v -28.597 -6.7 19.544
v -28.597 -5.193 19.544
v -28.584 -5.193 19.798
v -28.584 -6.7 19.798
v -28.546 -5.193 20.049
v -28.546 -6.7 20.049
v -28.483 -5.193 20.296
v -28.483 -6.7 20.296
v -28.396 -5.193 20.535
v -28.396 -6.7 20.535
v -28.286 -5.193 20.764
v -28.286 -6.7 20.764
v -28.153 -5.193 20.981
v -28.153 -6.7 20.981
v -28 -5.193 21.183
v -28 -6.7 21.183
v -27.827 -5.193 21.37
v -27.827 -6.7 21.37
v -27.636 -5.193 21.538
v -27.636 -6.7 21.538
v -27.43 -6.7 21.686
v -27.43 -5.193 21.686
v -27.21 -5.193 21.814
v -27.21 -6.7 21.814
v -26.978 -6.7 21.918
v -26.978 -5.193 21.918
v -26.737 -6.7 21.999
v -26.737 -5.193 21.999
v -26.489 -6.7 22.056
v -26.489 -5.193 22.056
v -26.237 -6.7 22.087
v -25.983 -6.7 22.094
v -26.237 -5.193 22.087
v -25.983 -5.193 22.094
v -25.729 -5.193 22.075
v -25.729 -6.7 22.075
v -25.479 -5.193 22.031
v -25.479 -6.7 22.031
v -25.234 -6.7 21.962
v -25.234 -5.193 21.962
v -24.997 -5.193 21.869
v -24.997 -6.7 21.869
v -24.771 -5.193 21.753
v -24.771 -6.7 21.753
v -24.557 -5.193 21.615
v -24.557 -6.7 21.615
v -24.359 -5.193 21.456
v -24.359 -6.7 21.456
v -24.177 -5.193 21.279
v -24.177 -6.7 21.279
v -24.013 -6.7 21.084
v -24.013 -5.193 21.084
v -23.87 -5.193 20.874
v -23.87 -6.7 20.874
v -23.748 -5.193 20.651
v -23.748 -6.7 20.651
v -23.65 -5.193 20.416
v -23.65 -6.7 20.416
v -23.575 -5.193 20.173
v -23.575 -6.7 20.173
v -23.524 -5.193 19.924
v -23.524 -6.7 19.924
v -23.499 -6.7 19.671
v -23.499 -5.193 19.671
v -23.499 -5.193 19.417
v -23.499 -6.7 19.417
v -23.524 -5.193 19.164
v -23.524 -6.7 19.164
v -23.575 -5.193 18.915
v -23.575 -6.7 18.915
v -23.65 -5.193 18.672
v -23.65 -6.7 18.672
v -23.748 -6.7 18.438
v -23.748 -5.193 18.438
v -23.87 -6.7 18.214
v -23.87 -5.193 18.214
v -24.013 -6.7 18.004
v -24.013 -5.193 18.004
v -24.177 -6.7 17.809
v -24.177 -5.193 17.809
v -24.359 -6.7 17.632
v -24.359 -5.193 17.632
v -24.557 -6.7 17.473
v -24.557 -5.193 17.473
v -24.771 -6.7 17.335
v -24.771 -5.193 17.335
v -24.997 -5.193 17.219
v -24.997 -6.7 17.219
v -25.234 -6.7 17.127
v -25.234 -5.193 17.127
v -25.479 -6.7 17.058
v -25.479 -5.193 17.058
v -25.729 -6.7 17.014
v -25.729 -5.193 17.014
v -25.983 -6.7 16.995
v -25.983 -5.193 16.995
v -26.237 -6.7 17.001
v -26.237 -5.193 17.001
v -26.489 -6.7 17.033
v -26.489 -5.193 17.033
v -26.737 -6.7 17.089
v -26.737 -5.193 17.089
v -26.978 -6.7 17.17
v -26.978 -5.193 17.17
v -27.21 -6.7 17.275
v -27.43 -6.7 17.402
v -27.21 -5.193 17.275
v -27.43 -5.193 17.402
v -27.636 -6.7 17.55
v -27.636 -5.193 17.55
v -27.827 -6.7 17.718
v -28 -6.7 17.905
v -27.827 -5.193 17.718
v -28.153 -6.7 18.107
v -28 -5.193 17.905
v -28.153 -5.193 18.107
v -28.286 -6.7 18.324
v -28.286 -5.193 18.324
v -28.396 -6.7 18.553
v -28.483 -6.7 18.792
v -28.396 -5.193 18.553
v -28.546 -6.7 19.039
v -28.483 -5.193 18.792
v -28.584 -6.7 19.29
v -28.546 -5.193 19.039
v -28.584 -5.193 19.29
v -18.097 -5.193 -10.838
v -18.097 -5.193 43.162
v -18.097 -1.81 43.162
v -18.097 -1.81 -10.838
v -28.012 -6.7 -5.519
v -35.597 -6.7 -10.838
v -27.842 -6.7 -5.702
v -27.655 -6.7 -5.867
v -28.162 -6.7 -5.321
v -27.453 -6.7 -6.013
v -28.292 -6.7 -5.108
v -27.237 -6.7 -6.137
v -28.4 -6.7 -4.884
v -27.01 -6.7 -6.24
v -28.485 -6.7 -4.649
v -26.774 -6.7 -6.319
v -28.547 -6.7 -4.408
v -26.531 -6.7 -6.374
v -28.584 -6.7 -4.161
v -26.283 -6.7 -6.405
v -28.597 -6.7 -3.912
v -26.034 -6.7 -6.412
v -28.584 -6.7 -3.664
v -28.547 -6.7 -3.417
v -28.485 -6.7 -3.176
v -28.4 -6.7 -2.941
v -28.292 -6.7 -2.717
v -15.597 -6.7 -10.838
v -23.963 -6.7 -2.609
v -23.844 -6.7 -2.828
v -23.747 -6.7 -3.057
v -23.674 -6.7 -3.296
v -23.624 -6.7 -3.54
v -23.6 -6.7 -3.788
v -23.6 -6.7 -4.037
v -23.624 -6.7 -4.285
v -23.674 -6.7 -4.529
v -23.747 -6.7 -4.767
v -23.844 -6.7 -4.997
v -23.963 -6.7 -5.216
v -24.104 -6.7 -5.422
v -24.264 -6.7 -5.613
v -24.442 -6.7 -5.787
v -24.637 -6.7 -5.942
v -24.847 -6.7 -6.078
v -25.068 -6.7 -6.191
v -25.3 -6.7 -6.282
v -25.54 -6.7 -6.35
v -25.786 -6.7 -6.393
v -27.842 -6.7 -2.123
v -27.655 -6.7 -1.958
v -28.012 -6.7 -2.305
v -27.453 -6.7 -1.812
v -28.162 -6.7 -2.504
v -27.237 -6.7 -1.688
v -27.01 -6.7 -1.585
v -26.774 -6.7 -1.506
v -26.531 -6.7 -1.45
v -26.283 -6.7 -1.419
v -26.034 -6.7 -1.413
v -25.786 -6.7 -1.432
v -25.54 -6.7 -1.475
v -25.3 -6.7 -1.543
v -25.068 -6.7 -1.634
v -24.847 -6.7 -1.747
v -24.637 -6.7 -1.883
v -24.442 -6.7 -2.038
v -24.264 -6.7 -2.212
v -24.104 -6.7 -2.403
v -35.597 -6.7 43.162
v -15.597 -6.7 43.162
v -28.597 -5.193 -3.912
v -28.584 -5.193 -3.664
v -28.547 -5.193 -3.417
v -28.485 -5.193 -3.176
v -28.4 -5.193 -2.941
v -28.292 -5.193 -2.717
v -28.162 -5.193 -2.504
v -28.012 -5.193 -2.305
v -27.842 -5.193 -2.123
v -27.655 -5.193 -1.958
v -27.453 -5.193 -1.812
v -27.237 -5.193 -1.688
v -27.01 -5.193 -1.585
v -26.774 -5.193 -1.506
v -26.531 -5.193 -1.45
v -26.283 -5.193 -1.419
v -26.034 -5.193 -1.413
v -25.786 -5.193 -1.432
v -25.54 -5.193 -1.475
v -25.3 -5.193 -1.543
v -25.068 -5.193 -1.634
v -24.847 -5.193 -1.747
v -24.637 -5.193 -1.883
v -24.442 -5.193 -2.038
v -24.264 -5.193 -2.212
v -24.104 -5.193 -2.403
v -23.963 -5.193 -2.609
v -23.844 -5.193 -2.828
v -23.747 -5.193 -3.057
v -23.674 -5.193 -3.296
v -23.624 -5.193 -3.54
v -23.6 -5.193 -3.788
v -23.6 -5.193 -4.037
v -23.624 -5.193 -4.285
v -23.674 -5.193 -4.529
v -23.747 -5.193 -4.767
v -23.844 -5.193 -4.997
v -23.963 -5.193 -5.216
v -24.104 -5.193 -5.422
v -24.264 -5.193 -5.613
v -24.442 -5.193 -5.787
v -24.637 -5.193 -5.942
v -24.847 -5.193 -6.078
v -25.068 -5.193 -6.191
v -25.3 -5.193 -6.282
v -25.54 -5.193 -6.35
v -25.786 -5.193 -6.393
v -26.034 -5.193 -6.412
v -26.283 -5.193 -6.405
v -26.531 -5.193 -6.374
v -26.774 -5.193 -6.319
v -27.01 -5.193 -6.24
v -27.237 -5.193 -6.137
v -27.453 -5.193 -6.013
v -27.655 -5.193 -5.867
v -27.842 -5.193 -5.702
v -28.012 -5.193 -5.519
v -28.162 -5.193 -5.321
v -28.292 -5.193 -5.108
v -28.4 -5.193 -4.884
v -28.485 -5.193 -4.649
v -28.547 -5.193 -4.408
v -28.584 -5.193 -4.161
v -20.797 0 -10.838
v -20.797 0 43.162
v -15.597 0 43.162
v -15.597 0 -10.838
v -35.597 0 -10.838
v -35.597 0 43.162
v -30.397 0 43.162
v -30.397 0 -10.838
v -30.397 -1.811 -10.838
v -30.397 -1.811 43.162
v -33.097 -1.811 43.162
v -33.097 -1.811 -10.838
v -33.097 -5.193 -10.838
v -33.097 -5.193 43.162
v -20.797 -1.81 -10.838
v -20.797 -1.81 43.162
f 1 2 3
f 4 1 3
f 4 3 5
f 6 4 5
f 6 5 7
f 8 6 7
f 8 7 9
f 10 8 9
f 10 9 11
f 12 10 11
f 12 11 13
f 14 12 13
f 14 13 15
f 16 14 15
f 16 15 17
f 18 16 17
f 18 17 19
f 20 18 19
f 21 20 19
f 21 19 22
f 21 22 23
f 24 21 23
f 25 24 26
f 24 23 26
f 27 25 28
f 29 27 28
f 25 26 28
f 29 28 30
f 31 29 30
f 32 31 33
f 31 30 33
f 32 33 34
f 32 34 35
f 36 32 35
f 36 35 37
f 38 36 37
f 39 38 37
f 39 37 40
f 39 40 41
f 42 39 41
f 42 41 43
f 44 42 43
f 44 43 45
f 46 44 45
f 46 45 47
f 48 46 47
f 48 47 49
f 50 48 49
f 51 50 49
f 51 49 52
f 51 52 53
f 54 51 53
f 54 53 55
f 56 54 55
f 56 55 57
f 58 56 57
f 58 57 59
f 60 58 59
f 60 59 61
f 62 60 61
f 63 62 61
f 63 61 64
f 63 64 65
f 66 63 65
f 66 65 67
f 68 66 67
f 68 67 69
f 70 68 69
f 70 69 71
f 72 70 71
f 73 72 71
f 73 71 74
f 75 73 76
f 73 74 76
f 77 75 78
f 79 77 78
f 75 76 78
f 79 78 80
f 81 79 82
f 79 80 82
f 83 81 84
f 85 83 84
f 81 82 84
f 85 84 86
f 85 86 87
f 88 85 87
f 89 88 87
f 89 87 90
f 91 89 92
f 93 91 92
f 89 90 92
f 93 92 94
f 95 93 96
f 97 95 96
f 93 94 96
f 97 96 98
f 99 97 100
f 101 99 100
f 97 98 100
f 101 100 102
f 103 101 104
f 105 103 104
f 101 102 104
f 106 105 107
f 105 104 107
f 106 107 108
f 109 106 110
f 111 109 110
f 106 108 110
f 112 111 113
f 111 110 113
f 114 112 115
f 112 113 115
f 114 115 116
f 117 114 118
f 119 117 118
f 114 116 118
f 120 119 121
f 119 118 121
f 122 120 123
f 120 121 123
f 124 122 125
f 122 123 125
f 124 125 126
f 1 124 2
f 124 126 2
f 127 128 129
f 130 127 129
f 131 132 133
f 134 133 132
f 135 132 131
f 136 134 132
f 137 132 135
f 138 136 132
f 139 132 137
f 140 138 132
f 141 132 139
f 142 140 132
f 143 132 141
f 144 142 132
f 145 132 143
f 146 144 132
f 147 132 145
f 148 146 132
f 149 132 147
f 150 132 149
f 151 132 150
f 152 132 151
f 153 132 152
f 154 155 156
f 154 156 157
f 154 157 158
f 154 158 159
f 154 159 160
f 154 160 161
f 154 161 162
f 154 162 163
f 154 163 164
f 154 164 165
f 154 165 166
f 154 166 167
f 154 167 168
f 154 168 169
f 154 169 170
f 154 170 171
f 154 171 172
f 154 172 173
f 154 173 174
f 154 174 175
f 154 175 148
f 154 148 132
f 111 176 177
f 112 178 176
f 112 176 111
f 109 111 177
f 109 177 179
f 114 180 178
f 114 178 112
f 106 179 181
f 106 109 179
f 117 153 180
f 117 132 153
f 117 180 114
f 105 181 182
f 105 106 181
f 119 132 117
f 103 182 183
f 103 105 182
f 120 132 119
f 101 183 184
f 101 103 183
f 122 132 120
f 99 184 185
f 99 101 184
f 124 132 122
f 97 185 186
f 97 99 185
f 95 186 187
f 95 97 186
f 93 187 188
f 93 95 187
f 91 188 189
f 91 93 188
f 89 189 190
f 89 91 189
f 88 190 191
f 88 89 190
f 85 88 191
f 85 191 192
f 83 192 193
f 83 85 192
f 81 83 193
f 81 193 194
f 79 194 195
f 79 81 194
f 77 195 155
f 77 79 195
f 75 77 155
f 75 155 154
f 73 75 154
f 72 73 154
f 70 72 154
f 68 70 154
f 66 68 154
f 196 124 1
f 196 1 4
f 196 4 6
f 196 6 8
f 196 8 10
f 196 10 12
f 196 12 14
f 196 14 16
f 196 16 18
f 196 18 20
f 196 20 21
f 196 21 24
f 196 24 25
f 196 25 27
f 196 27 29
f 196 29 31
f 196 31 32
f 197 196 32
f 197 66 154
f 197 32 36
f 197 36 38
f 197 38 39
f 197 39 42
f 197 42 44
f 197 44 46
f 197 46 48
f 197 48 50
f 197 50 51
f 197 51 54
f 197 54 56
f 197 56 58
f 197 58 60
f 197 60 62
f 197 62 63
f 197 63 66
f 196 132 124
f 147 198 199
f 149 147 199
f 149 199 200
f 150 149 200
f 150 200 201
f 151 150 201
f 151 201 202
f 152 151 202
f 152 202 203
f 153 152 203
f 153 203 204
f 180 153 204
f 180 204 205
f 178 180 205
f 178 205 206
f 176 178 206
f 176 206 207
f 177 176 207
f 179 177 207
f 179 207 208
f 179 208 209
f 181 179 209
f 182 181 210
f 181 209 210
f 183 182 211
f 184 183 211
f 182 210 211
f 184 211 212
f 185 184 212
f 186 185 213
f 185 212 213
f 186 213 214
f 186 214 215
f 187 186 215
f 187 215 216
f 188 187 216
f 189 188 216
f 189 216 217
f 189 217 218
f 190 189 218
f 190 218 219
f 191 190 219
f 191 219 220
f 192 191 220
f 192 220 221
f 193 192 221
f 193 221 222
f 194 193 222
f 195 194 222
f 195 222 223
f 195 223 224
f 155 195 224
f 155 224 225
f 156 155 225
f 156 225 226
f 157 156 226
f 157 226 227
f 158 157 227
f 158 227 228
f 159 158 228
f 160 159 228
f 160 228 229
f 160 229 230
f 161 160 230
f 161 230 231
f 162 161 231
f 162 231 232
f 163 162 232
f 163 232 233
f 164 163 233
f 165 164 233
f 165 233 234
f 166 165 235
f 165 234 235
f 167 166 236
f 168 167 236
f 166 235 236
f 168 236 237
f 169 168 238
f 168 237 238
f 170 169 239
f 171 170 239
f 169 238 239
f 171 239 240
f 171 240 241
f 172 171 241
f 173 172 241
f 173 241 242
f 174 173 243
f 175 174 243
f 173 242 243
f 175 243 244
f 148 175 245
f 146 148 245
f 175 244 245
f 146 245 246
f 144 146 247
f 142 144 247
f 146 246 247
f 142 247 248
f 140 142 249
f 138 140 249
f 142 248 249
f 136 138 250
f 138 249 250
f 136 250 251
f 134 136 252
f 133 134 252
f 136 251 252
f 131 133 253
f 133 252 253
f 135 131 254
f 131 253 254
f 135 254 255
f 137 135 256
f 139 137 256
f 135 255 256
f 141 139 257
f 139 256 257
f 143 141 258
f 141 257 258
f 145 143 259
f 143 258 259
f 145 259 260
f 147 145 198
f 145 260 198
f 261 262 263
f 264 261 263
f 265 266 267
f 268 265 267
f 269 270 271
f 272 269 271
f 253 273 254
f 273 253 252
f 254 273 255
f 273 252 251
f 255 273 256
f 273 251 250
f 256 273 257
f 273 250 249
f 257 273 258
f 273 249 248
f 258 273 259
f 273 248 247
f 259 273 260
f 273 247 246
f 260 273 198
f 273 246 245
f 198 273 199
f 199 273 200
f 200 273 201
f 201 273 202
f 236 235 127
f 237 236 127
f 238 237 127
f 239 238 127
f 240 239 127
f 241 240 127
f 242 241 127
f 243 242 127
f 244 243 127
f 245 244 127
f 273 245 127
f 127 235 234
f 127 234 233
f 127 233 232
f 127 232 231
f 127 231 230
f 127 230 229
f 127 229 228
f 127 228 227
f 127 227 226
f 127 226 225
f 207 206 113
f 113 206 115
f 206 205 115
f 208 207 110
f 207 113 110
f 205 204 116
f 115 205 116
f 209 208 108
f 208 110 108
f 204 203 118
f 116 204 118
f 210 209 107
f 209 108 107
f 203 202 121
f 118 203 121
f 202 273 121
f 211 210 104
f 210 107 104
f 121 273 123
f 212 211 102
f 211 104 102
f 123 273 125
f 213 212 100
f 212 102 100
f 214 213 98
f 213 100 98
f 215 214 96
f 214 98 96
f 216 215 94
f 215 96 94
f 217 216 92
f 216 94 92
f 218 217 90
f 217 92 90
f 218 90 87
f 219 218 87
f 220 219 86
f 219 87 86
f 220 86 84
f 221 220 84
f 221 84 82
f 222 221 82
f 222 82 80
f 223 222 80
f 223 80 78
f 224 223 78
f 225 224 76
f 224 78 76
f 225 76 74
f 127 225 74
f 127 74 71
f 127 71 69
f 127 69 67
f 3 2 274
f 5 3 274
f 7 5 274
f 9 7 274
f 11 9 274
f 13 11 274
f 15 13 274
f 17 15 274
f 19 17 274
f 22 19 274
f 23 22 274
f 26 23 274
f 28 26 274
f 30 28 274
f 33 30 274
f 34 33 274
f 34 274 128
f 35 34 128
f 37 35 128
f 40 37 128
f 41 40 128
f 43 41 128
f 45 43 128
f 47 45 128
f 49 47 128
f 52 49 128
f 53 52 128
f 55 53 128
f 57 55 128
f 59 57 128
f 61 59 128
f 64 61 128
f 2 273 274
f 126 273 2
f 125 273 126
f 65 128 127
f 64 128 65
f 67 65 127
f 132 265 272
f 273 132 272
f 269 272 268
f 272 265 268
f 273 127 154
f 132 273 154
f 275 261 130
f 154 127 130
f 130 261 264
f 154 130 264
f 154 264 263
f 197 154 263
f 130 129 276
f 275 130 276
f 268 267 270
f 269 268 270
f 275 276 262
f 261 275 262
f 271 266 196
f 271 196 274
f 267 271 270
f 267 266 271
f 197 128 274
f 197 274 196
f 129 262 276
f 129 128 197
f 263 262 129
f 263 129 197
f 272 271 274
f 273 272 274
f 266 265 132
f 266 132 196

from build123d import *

# Parameters (mm, degrees)
F0_W     = 20
F0_H     = 54
F1_DEPTH = 6.7
F3_DEPTH = 67.5
F4_R     = 2.550327
F4_R_2   = 2.5
F5_DEPTH = 25


with BuildPart() as f1:
    # F0 (on Front) → F1 (new body)
    with BuildSketch(Plane.XZ):
        with Locations((-25.59652, 16.161585)):
            Rectangle(F0_W, F0_H)
    extrude(amount=F1_DEPTH)

    # F2 (on face) → F3 (cut)
    with BuildSketch(Plane.XY.offset(43.161585)):
        Polygon((-20.79652, -1.810443), (-20.79652, 0), (-30.39652, 0), (-30.39652, -1.811175), (-33.09652, -1.811175), (-33.09652, -5.193342), (-18.09652, -5.193342), (-18.09652, -1.810443), align=None)
    extrude(amount=-F3_DEPTH, mode=Mode.SUBTRACT)

    # F4 (on face) → F5 (cut)
    with BuildSketch(Plane(origin=(0, -5.193342, 0), x_dir=(-1, 0, 0), z_dir=(0, 1, 0))):
        with Locations((26.046193, 19.544126)):
            Circle(F4_R)
        with Locations((26.09652, -3.912448)):
            Circle(F4_R_2)
    extrude(amount=-F5_DEPTH, mode=Mode.SUBTRACT)


solid = f1.part
